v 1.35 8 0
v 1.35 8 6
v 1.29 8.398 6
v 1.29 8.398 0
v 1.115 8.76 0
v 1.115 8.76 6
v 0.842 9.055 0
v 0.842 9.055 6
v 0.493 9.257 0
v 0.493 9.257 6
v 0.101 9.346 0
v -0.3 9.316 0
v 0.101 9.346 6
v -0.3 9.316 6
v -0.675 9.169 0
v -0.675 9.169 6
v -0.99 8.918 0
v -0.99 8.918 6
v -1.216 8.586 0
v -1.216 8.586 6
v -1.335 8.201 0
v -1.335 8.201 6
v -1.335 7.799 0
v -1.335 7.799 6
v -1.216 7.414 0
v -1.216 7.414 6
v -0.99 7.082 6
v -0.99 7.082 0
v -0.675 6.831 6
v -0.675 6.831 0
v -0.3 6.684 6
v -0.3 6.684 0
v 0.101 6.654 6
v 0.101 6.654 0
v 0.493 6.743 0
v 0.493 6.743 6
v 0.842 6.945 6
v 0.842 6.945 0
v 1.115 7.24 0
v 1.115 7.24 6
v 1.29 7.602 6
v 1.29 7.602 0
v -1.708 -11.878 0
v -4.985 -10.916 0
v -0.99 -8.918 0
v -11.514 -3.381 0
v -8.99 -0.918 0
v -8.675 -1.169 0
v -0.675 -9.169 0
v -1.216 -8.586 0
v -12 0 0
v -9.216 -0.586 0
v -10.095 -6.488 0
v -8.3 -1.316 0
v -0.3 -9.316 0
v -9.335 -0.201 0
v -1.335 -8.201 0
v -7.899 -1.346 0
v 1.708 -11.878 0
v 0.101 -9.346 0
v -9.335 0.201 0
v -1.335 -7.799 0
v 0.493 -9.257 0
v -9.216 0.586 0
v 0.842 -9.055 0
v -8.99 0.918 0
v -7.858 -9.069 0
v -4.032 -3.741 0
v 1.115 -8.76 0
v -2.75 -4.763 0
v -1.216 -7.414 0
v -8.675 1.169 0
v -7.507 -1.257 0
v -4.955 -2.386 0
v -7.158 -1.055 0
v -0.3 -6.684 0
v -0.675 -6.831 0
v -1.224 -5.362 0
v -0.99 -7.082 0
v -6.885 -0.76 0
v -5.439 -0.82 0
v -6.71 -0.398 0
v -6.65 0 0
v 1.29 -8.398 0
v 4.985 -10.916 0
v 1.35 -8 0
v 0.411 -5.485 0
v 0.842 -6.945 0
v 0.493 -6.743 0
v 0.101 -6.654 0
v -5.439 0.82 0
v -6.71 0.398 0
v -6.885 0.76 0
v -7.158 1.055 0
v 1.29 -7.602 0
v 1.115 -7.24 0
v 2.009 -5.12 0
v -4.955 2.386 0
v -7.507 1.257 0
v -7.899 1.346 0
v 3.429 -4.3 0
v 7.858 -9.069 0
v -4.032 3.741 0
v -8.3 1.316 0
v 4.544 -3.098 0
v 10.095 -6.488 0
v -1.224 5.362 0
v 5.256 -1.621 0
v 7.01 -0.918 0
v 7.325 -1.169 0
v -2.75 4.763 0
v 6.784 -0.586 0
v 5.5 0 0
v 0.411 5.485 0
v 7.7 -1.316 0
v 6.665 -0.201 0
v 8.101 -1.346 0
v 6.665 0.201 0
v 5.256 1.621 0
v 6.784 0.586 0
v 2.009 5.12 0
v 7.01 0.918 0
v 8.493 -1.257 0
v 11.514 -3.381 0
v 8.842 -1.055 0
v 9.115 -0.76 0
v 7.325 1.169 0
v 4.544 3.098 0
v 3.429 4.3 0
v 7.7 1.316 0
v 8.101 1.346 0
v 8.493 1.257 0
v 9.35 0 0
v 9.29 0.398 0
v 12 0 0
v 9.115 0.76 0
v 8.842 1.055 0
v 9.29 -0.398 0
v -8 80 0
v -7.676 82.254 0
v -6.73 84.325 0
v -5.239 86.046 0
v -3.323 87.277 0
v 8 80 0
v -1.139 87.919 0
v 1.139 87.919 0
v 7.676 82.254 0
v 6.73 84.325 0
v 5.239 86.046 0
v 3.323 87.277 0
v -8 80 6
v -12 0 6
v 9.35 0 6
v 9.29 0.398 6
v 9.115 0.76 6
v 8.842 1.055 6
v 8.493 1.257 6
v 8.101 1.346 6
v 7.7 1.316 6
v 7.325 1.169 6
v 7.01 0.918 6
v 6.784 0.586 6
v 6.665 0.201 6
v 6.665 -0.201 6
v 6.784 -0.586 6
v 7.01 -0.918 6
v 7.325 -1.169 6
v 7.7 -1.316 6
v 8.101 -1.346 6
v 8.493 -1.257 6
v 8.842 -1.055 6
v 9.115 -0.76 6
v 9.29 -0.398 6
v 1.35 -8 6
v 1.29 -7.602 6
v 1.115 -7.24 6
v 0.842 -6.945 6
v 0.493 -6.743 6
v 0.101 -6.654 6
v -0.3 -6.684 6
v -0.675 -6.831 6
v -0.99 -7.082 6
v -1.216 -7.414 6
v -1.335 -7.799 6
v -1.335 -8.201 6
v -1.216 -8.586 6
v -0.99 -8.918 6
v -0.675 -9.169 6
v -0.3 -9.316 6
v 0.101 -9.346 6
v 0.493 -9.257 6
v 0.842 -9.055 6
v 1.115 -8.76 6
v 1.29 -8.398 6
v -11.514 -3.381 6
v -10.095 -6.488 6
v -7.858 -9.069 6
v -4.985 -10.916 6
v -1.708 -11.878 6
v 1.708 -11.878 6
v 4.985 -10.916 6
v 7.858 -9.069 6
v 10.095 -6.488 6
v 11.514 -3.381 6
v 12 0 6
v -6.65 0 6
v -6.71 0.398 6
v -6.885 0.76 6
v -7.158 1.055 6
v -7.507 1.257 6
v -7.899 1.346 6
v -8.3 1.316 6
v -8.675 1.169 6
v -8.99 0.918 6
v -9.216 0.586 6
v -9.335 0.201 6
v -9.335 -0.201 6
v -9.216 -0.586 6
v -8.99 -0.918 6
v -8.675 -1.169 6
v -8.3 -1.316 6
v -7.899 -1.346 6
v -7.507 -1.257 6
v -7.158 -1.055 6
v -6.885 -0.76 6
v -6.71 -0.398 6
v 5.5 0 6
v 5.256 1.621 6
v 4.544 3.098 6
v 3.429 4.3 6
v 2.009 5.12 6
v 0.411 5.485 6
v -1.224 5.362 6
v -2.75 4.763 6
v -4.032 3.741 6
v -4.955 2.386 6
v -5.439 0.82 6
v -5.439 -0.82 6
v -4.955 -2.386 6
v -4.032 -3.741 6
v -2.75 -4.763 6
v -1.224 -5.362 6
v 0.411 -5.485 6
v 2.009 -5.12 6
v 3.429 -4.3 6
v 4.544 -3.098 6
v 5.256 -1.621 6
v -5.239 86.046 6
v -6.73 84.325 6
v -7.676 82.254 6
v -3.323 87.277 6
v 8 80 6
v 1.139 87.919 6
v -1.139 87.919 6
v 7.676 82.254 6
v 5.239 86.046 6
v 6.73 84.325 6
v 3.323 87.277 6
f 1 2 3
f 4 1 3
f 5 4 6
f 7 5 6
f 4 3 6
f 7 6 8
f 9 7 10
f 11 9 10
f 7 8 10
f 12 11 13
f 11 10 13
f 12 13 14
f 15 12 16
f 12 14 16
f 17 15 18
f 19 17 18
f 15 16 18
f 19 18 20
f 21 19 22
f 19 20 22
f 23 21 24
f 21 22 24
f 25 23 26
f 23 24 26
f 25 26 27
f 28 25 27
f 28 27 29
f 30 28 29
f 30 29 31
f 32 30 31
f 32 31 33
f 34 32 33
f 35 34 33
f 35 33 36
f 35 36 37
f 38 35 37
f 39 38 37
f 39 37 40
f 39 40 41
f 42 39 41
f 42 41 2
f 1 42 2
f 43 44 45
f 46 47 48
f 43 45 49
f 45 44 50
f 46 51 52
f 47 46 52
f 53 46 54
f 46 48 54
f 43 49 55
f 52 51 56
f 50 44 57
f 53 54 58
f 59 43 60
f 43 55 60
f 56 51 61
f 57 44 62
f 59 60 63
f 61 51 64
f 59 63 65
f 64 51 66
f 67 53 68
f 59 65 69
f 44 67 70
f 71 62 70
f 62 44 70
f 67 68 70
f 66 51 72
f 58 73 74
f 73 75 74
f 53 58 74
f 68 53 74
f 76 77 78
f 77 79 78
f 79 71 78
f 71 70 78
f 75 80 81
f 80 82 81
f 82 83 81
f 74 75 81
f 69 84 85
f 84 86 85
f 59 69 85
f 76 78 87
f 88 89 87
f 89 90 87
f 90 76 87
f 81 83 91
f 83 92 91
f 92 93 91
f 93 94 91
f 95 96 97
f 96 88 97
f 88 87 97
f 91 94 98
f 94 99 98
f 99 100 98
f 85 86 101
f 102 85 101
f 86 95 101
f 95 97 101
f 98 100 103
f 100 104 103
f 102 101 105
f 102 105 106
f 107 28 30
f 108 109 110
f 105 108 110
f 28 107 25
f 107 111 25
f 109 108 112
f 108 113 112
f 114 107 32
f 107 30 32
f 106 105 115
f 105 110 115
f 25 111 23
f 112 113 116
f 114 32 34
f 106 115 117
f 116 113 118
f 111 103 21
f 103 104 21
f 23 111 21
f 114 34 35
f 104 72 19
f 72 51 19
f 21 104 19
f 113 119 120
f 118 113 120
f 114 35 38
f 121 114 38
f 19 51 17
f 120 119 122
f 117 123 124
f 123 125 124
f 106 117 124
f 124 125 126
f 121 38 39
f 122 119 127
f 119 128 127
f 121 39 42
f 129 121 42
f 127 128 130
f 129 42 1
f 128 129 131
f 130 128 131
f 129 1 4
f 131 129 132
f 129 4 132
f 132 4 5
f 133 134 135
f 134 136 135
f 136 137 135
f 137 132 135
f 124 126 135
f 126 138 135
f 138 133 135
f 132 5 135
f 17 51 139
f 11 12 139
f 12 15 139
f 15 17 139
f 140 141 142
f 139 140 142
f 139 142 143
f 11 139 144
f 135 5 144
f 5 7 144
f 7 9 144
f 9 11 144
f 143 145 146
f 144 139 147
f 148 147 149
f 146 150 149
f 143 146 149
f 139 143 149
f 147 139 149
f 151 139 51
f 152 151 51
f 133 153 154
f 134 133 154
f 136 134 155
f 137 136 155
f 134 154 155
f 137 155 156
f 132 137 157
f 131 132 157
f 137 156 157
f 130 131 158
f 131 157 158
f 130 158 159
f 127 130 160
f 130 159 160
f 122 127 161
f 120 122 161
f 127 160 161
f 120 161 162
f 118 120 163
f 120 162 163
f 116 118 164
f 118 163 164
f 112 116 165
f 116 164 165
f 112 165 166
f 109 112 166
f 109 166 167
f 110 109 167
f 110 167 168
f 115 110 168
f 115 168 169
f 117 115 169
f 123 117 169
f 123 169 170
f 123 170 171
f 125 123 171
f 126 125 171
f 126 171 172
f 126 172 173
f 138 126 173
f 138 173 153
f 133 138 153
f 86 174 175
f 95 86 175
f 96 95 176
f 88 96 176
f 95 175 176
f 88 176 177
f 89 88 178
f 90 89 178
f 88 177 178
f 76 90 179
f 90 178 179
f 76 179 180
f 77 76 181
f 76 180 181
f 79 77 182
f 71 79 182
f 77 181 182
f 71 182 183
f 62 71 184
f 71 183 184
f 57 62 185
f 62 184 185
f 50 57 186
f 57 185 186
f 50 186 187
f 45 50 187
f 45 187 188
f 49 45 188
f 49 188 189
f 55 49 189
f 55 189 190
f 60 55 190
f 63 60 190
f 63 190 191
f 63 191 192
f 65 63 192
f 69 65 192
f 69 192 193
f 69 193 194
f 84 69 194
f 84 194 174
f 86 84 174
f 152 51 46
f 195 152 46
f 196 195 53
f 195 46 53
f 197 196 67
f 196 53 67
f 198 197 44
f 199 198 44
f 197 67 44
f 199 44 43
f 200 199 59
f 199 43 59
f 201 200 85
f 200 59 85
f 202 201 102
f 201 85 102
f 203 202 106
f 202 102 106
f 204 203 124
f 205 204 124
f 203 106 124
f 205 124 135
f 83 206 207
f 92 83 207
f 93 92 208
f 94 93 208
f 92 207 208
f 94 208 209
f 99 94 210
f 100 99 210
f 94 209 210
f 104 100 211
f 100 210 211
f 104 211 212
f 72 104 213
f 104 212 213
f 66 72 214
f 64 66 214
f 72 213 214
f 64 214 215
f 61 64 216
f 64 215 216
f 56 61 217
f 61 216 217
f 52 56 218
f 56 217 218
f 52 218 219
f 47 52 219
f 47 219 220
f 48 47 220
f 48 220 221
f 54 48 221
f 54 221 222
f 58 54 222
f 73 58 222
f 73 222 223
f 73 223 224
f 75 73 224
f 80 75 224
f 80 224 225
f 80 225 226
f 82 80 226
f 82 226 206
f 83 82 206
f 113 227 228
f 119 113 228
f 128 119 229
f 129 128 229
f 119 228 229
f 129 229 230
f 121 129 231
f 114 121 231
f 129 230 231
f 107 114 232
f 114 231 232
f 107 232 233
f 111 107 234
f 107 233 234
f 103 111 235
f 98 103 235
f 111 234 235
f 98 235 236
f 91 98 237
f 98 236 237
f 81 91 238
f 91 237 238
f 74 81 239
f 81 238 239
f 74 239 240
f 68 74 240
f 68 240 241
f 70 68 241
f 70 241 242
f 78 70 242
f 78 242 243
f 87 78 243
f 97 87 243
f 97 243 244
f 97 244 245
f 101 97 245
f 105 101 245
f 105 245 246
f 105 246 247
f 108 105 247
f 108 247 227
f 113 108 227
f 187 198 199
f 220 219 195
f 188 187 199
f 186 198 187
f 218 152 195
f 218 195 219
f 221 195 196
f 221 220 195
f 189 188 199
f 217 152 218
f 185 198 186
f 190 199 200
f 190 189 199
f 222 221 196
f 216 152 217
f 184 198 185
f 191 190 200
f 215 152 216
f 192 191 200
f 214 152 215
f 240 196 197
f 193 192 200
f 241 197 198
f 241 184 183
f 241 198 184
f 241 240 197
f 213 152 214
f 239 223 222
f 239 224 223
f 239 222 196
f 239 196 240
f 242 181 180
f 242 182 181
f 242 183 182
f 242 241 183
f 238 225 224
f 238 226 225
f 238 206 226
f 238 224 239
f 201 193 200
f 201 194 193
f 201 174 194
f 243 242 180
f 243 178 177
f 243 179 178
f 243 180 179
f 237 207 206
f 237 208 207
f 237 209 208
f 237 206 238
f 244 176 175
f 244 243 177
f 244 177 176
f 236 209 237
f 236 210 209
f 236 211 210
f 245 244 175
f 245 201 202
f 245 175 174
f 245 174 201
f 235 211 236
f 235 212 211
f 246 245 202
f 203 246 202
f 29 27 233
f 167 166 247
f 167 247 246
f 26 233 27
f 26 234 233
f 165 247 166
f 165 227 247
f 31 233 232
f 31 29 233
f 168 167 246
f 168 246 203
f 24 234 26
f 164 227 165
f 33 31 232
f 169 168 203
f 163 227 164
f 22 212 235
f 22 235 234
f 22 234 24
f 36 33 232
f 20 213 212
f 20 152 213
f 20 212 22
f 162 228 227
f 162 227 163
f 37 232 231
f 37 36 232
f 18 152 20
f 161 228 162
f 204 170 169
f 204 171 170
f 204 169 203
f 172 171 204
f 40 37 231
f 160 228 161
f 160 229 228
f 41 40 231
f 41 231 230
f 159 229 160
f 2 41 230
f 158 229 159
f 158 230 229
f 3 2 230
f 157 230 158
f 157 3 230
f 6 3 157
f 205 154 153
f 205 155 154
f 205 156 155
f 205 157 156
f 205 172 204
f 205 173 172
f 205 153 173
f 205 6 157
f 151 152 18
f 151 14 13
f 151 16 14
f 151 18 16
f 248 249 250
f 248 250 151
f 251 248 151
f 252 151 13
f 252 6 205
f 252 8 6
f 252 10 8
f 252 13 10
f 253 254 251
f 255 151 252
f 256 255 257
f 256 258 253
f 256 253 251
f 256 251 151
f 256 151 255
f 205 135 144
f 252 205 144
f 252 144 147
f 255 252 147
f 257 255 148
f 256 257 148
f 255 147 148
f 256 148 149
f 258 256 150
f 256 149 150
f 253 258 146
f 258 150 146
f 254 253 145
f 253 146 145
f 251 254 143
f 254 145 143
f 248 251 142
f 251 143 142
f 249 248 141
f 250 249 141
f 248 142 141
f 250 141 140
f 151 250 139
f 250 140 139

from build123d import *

# Parameters (mm, degrees)
BOSS_EXTRU_1_DEPTH           = 6
ESQUISSE2_R                  = 5.5
ESQUISSE2_R_2                = 1.35
ENL_V_MAT_EXTRU_1_DEPTH      = 1
ENL_V_MAT_EXTRU_1_DEPTH_BACK = 7


with BuildPart() as part:
    # Esquisse1 → Boss.-Extru.1 (new body)
    with BuildSketch(Plane.XY):
        with BuildLine():
            Line((12, 0), (8, 80))
            ThreePointArc((8, 80), (0, 88), (-8, 80))
            Line((-8, 80), (-12, 0))
            ThreePointArc((-12, 0), (0, -12), (12, 0))
        make_face()
    extrude(amount=BOSS_EXTRU_1_DEPTH)

    # Esquisse2 → Enlèv. mat.-Extru.1 (cut, two sides)
    with BuildSketch(Plane.XY.offset(6)) as enl_v_mat_extru_1_sk:
        Circle(ESQUISSE2_R)
        with Locations((8, 0)):
            Circle(ESQUISSE2_R_2)
        with Locations((0, -8)):
            Circle(ESQUISSE2_R_2)
        with Locations((-8, 0)):
            Circle(ESQUISSE2_R_2)
        with Locations((0, 8)):
            Circle(ESQUISSE2_R_2)
    extrude(amount=ENL_V_MAT_EXTRU_1_DEPTH, mode=Mode.SUBTRACT)
    extrude(enl_v_mat_extru_1_sk.sketch, amount=-ENL_V_MAT_EXTRU_1_DEPTH_BACK, mode=Mode.SUBTRACT)


solid = part.part
